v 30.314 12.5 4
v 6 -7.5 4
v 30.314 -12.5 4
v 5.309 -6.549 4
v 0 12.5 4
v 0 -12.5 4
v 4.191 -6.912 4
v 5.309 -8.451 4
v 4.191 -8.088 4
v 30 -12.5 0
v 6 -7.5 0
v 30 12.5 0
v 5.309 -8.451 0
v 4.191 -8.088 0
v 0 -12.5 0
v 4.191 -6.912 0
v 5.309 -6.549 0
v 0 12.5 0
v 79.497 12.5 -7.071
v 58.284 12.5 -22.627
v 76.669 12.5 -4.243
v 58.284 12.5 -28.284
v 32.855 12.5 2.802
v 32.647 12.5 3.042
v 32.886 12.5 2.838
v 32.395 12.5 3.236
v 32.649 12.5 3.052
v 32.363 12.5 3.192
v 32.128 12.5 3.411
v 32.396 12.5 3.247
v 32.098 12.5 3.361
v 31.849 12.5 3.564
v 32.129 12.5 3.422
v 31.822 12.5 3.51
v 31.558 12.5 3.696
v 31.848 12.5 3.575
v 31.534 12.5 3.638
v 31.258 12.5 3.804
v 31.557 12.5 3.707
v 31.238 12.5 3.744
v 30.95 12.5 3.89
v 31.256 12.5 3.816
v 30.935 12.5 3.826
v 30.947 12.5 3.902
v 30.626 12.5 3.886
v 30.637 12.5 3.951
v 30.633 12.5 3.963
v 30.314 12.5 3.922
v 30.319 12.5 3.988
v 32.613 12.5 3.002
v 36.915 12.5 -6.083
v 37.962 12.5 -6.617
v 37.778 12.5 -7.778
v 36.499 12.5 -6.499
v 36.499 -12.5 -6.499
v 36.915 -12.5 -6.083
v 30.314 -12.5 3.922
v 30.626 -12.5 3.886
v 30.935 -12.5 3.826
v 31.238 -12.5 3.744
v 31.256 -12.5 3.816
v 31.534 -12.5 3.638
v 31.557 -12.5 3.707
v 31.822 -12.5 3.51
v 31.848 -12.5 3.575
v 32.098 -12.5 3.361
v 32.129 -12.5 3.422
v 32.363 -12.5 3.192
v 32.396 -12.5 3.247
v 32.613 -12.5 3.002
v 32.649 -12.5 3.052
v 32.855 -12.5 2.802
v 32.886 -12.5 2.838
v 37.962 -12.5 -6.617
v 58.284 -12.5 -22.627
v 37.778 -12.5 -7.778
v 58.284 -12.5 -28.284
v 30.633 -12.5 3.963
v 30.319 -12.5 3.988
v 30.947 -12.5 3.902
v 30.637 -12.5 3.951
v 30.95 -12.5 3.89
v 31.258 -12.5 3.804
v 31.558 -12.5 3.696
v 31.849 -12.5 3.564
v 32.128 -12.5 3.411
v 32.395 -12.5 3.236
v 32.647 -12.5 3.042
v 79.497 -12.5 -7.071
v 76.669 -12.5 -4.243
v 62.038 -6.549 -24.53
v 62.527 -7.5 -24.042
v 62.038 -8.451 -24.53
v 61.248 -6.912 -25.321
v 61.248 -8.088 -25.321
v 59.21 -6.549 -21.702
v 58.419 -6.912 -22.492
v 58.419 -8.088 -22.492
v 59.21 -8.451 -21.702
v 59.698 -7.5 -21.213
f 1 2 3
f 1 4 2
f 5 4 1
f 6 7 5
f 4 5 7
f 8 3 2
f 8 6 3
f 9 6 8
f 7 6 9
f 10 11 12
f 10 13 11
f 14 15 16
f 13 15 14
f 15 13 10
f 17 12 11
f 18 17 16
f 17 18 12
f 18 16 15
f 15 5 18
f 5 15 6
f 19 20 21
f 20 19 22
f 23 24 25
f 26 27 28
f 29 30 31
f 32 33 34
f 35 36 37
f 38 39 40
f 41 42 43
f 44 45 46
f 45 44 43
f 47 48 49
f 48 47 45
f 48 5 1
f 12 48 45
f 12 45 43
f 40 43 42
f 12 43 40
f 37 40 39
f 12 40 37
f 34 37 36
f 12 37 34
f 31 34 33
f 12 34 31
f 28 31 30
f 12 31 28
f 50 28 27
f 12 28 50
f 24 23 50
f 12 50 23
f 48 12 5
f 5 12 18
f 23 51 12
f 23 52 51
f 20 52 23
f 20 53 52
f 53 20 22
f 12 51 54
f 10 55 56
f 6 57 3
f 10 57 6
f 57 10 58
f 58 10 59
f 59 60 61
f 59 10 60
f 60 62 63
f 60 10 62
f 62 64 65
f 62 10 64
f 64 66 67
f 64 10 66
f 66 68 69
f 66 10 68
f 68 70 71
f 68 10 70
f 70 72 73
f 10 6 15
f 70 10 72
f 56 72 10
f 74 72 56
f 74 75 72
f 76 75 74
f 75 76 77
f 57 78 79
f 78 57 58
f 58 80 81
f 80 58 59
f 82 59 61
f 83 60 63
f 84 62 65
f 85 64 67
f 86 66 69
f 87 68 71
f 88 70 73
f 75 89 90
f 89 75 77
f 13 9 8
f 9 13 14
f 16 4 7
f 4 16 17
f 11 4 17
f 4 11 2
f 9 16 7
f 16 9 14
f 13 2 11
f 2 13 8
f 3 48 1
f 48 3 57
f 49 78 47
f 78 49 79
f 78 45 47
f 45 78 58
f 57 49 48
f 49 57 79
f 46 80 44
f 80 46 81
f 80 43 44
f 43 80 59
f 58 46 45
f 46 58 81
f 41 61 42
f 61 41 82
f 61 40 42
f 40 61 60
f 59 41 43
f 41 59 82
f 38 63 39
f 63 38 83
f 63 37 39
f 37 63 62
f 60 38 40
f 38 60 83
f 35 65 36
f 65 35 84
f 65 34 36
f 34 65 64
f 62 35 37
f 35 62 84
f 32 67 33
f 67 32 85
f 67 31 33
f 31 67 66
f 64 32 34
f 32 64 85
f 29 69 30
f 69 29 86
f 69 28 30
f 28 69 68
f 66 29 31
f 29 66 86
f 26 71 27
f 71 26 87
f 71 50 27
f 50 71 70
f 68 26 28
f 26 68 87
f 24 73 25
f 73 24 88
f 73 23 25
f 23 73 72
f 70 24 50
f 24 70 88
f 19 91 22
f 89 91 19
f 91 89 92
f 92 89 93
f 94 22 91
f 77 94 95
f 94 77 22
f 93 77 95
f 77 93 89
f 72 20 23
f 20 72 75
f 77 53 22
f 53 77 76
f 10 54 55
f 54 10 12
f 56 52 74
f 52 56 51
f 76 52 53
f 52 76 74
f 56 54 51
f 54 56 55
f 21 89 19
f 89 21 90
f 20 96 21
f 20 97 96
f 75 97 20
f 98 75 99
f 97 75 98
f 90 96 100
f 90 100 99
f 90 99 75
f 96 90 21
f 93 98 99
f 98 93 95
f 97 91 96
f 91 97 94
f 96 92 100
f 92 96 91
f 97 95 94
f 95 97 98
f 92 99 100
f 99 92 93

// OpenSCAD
// === bent_bar_with_holes.scad ===
// Librairie OpenSCAD modulaire pour modéliser une barre pliée avec perçages personnalisés

// === MODULE SEGMENT ===
module segment(len, bar_width, bar_thickness) {
    translate([0, -bar_width / 2, 0])
        cube([len, bar_width, bar_thickness]);
}

// === MODULE ARC POLYGONAL ===
module arc_bridge(angle_total, radius, width, thickness, steps) {
    angle_step = angle_total / steps;
    arc_len = radius * angle_step * PI / 180;

    for (i = [0 : steps - 1]) {
        rot = angle_step * i;
        translate([radius * sin(rot * PI / 180), 0, radius * (1 - cos(rot * PI / 180))])
            rotate([0, rot, 0])
                translate([0, -width / 2, 0])
                    cube([arc_len, width, thickness]);
    }
}

// === MODULE TROU GÉNÉRIQUE ===
// pos = [x, y] relatif au coin inférieur avant gauche du segment
module hole(d, pos, axis, bar_width, bar_thickness, len_seg) {
    if (axis == "Y") {
        translate([pos[0], 0, pos[1]])
            rotate([90, 0, 0])
                cylinder(d=d, h=bar_width + 1, center=true);
    }
    else if (axis == "Z") {
        translate([pos[0], pos[1] - bar_width / 2, -0.01])
            cylinder(d=d, h=bar_thickness + 0.02, center=false);
    }
}

// === FONCTION POUR EXTRAIRE LES TROUS CIBLÉS D'UN SEGMENT ===
function holes_for_segment(holes, index) = [ for (h = holes) if (h[0] == index) h ];

// === MODULE PRINCIPAL DE CONSTRUCTION ===
module bent_bar(sequence, holes = [], bar_width=20, bar_thickness=5, arc_radius=5, arc_steps=9) {
    bent_bar_internal(sequence, holes, bar_width, bar_thickness, arc_radius, arc_steps, 0);
}

module bent_bar_internal(seq, holes, bar_width, bar_thickness, arc_radius, arc_steps, i = 0) {
    if (i < len(seq)) {
        len_seg = seq[i][0];
        bend_angle = seq[i][1];

        union() {
            let (segment_holes = holes_for_segment(holes, i))
                if (len(segment_holes) > 0) {
                    difference() {
                        segment(len_seg, bar_width, bar_thickness);
                        for (h = segment_holes)
                            hole(h[2], h[1], h[3], bar_width, bar_thickness, len_seg);
                    }
                } else {
                    segment(len_seg, bar_width, bar_thickness);
                }

            if (bend_angle != 0 &&
                abs(bend_angle) % 90 != 0 &&
                abs(bend_angle) % 180 != 0) {
                translate([len_seg, 0, 0])
                    rotate([0, bend_angle > 0 ? 0 : 180, 0])
                        arc_bridge(abs(bend_angle), arc_radius, bar_width, bar_thickness, arc_steps);
            }

            translate([len_seg, 0, 0])
                rotate([0, bend_angle, 0])
                    bent_bar_internal(seq, holes, bar_width, bar_thickness, arc_radius, arc_steps, i + 1);
        }
    }
}
bend_sequence = [
  [30, 45],
  [40, -90],
  [30, 0]
];

holes = [
  [0, [5, 5], 2, "Z"],
  [1, [10, 0], 2, "Y"],
  [2, [5, 5], 2, "Z"]
];

bent_bar(
  bend_sequence,
  holes,
  bar_width = 25,
  bar_thickness = 4,
  arc_radius = 4,
  arc_steps = 10
);
